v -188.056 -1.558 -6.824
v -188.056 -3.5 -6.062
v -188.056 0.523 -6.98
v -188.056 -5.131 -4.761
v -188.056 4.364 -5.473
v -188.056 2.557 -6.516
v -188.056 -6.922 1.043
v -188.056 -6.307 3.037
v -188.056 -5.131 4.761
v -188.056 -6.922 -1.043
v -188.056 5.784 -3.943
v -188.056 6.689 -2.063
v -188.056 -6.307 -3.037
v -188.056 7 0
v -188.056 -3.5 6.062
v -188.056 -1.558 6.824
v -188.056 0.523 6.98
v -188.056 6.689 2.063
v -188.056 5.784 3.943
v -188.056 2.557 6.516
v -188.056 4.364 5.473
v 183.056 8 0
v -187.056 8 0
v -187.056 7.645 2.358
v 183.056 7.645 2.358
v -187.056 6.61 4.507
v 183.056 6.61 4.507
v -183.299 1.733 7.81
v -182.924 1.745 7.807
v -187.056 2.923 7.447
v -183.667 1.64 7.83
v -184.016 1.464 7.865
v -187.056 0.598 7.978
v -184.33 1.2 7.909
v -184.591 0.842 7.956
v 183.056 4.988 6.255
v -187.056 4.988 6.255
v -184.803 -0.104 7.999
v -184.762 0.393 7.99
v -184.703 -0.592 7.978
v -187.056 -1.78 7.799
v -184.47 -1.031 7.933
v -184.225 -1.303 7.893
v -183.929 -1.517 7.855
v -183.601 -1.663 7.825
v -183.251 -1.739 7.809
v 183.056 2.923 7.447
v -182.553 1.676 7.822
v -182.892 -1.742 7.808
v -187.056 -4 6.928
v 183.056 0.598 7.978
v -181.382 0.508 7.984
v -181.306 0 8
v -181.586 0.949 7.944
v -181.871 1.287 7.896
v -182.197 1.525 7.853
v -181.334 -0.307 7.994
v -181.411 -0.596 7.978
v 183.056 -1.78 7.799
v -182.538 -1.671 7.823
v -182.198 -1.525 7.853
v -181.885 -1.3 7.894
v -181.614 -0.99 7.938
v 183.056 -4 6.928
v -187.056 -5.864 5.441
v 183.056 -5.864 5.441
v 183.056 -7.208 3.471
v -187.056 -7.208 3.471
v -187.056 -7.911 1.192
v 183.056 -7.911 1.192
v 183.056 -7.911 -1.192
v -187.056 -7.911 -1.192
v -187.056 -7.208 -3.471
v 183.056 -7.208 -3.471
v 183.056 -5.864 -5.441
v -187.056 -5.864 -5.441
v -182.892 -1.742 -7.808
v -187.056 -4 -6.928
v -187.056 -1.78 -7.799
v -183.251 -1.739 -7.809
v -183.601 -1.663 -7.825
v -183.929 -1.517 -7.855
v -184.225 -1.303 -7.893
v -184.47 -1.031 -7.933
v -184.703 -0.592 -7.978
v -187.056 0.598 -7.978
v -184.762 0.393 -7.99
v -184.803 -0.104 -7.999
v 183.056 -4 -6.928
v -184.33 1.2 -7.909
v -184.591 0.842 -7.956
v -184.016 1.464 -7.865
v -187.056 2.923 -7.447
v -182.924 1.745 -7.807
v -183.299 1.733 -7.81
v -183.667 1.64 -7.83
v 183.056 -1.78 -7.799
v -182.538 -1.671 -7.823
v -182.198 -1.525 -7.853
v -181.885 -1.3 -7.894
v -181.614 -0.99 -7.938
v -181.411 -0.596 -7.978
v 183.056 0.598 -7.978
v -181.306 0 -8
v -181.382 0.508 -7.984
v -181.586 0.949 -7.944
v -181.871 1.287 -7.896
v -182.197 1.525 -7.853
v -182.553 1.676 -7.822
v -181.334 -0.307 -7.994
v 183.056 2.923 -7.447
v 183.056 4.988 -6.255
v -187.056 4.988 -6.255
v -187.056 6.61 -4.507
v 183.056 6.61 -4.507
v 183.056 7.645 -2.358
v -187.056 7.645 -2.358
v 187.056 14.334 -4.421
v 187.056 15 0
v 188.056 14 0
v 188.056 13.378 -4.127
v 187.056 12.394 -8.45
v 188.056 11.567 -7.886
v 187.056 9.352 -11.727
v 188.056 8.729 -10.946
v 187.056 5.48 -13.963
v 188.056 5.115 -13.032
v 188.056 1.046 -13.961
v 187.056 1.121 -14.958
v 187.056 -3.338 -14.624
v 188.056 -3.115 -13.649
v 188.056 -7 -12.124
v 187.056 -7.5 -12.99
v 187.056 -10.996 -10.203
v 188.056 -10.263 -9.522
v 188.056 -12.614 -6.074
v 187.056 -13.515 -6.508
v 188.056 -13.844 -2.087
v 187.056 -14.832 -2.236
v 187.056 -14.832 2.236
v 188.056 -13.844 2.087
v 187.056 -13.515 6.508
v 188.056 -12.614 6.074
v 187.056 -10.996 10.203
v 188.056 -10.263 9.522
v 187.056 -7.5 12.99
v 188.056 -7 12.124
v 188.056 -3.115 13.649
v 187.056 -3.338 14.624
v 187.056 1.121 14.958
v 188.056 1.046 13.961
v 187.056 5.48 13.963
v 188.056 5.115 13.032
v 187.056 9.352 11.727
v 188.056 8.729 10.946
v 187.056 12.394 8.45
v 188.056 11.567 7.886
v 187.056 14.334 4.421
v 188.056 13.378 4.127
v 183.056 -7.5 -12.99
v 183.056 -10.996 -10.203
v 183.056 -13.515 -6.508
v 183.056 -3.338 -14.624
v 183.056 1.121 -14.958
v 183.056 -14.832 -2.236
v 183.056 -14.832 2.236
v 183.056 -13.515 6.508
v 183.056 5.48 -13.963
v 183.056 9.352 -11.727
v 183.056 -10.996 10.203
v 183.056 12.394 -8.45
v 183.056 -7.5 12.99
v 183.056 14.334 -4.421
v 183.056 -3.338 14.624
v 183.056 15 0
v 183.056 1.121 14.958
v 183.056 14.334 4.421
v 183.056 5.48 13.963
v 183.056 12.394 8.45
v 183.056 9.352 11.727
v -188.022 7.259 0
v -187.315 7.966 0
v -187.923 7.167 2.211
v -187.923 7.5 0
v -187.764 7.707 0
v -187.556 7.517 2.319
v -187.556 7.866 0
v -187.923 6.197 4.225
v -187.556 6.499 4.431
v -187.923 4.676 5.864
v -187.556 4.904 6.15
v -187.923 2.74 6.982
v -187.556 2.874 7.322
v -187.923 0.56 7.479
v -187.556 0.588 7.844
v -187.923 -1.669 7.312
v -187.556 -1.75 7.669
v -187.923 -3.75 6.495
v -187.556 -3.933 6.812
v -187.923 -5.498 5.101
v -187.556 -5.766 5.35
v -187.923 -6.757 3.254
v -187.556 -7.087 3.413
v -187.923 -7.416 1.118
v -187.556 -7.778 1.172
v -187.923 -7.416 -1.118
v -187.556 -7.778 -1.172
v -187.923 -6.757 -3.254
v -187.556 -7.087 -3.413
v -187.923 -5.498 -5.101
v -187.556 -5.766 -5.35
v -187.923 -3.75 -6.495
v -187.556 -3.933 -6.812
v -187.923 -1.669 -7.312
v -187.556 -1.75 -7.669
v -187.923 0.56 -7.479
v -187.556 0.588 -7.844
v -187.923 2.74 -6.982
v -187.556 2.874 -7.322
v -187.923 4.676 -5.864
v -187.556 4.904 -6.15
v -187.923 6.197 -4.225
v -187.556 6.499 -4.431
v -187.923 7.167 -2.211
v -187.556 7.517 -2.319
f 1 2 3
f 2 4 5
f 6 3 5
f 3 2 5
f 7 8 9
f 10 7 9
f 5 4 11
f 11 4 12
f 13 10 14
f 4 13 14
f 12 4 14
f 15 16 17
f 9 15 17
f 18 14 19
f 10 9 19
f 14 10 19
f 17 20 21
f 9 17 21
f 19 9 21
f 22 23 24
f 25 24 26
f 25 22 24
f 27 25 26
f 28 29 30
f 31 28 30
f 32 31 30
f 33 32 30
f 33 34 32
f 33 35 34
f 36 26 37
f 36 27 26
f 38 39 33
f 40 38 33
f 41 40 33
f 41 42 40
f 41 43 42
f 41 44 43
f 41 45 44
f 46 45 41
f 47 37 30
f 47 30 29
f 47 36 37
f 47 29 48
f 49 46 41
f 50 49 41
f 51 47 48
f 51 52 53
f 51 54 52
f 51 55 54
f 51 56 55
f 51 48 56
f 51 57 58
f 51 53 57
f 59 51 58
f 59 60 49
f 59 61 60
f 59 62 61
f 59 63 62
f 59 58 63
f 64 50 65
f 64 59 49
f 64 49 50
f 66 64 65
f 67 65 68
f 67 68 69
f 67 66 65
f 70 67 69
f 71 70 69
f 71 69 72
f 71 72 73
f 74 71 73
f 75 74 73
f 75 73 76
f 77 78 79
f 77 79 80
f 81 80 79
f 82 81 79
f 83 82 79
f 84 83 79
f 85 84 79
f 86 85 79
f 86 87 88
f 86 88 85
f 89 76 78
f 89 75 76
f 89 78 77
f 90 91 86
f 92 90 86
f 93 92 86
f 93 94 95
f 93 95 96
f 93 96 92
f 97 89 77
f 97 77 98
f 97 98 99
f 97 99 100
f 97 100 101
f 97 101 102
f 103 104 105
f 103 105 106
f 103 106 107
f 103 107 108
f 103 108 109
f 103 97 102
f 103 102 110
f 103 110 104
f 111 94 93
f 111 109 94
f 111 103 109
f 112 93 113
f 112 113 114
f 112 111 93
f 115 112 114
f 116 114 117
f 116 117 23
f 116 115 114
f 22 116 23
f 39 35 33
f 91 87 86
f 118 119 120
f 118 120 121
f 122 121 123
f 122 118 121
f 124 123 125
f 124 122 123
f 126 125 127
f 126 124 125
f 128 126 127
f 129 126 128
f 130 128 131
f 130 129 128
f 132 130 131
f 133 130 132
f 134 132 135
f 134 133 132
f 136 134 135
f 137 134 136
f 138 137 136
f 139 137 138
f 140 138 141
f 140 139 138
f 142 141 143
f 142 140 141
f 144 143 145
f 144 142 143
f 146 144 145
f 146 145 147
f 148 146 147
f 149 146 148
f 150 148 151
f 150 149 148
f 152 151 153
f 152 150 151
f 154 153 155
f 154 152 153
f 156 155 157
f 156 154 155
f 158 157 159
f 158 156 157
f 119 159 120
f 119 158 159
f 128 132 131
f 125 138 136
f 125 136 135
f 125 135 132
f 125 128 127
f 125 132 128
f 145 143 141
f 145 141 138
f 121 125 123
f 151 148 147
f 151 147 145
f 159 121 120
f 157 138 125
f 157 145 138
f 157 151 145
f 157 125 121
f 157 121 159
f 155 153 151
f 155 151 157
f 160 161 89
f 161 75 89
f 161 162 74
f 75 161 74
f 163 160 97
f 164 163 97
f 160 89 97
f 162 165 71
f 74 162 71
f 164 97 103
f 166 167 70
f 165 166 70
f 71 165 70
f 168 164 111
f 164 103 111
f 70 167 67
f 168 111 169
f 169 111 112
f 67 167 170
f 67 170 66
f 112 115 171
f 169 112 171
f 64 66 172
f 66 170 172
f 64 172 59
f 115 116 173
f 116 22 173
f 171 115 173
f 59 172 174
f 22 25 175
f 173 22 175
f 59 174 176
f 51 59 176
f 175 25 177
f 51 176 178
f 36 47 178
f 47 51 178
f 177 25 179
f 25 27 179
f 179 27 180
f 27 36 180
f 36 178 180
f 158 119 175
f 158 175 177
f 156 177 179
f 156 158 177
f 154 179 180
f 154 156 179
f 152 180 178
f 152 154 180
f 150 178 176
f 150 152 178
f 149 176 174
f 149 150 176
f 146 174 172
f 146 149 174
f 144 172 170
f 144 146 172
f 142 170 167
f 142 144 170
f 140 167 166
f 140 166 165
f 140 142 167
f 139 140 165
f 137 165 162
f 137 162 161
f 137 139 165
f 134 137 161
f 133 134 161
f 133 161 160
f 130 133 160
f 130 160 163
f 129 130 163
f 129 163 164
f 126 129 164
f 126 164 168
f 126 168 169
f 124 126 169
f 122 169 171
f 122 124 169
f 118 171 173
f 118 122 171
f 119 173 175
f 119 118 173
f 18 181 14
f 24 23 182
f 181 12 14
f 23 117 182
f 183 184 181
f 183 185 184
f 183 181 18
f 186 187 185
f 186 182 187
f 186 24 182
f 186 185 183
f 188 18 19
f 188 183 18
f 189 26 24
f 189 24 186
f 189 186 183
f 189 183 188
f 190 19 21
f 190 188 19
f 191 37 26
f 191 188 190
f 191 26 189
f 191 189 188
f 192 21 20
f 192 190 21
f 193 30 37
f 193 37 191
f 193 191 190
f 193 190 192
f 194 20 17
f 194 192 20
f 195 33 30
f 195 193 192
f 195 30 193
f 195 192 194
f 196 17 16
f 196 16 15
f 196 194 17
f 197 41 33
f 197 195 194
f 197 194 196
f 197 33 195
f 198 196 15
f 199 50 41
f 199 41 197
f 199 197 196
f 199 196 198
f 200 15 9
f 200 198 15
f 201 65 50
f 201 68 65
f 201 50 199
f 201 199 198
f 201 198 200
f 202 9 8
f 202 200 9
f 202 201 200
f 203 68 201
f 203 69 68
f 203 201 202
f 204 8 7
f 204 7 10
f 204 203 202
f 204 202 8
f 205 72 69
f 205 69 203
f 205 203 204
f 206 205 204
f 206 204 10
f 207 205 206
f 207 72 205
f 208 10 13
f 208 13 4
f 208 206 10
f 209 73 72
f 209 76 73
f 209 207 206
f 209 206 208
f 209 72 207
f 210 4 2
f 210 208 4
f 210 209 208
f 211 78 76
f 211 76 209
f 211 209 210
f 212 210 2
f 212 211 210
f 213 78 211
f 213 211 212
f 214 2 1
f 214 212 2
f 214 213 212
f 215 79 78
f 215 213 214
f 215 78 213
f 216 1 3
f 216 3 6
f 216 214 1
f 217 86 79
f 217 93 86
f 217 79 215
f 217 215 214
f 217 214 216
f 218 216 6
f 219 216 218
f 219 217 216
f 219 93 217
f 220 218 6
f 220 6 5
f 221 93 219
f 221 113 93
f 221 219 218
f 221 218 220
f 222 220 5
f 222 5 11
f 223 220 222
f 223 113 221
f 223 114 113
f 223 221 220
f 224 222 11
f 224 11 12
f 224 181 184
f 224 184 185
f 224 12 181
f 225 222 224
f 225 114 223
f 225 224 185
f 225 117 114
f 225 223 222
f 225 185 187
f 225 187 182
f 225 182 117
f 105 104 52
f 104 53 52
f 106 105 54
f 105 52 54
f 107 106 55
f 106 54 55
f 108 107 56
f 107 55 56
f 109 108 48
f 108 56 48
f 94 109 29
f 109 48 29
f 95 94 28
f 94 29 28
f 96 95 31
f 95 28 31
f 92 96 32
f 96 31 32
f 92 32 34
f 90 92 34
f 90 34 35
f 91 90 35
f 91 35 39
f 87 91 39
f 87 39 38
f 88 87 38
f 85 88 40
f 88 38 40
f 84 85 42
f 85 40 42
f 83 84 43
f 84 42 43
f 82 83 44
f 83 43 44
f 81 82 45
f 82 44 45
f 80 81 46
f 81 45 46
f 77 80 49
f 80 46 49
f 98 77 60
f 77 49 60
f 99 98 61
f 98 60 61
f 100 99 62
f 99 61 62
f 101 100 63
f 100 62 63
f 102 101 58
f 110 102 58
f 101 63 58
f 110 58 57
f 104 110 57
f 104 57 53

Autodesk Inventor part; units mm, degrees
ref_plane "YZ Plane" through (0, 0, 0) normal (1, 0, 0) x (0, 1, 0)
ref_plane "XZ Plane" through (0, 0, 0) normal (0, 1, 0) x (-1, 0, 0)
ref_plane "XY Plane" through (0, 0, 0) normal (0, 0, 1) x (1, 0, 0)
sketch "Sketch1" plane through (0, 0, 0) normal (0, 0, 1) x (1, 0, 0)
  line L0 (-188.0565, 0) -> (188.0565, 0)
  line L1 (-188.0565, 0) -> (-188.0565, 8)
  line L2 (-188.0565, 8) -> (183.0565, 8)
  line L3 (183.0565, 8) -> (183.0565, 15)
  line L4 (183.0565, 15) -> (188.0565, 15)
  line L5 (188.0565, 15) -> (188.0565, 0)
  circle A0 centre (-183.0565, 0) radius 1.75
  point P0 (0, 0)
  point P1 (0, 0)
  point P2 (183.0565, 8.25)
  dimension "d0" = 376.113
  dimension "d1" = 16
  dimension "d2" = 5
  dimension "d3" = 30
  dimension "d8" = 3.5
  dimension "d9" = 5
  dimension "d12" = 0.25
revolve "Revolution1" add sketch "Sketch1" angle 360 about axis through (-188.0565, 0, 0) along (1, 0, 0) picked at (-182.9862, 0.5791) contours A0 L0 L1 L2 L3 L4 L5 | L0 A0
fillet "Fillet1" radius 1 1 edges at (-188.0565, -8, 0)
chamfer "Chamfer1" distance 1 angle 45 3 edges at (188.0565, -15, 0) (-187.0565, -8, 0) (-188.0565, -7, 0)
extrude "Extrusion2" cut sketch "Sketch1" against normal through all both and the other way through all contours A0 L0 | L0 A0
properties part number "PWTR-0158" material "Stainless Steel"
